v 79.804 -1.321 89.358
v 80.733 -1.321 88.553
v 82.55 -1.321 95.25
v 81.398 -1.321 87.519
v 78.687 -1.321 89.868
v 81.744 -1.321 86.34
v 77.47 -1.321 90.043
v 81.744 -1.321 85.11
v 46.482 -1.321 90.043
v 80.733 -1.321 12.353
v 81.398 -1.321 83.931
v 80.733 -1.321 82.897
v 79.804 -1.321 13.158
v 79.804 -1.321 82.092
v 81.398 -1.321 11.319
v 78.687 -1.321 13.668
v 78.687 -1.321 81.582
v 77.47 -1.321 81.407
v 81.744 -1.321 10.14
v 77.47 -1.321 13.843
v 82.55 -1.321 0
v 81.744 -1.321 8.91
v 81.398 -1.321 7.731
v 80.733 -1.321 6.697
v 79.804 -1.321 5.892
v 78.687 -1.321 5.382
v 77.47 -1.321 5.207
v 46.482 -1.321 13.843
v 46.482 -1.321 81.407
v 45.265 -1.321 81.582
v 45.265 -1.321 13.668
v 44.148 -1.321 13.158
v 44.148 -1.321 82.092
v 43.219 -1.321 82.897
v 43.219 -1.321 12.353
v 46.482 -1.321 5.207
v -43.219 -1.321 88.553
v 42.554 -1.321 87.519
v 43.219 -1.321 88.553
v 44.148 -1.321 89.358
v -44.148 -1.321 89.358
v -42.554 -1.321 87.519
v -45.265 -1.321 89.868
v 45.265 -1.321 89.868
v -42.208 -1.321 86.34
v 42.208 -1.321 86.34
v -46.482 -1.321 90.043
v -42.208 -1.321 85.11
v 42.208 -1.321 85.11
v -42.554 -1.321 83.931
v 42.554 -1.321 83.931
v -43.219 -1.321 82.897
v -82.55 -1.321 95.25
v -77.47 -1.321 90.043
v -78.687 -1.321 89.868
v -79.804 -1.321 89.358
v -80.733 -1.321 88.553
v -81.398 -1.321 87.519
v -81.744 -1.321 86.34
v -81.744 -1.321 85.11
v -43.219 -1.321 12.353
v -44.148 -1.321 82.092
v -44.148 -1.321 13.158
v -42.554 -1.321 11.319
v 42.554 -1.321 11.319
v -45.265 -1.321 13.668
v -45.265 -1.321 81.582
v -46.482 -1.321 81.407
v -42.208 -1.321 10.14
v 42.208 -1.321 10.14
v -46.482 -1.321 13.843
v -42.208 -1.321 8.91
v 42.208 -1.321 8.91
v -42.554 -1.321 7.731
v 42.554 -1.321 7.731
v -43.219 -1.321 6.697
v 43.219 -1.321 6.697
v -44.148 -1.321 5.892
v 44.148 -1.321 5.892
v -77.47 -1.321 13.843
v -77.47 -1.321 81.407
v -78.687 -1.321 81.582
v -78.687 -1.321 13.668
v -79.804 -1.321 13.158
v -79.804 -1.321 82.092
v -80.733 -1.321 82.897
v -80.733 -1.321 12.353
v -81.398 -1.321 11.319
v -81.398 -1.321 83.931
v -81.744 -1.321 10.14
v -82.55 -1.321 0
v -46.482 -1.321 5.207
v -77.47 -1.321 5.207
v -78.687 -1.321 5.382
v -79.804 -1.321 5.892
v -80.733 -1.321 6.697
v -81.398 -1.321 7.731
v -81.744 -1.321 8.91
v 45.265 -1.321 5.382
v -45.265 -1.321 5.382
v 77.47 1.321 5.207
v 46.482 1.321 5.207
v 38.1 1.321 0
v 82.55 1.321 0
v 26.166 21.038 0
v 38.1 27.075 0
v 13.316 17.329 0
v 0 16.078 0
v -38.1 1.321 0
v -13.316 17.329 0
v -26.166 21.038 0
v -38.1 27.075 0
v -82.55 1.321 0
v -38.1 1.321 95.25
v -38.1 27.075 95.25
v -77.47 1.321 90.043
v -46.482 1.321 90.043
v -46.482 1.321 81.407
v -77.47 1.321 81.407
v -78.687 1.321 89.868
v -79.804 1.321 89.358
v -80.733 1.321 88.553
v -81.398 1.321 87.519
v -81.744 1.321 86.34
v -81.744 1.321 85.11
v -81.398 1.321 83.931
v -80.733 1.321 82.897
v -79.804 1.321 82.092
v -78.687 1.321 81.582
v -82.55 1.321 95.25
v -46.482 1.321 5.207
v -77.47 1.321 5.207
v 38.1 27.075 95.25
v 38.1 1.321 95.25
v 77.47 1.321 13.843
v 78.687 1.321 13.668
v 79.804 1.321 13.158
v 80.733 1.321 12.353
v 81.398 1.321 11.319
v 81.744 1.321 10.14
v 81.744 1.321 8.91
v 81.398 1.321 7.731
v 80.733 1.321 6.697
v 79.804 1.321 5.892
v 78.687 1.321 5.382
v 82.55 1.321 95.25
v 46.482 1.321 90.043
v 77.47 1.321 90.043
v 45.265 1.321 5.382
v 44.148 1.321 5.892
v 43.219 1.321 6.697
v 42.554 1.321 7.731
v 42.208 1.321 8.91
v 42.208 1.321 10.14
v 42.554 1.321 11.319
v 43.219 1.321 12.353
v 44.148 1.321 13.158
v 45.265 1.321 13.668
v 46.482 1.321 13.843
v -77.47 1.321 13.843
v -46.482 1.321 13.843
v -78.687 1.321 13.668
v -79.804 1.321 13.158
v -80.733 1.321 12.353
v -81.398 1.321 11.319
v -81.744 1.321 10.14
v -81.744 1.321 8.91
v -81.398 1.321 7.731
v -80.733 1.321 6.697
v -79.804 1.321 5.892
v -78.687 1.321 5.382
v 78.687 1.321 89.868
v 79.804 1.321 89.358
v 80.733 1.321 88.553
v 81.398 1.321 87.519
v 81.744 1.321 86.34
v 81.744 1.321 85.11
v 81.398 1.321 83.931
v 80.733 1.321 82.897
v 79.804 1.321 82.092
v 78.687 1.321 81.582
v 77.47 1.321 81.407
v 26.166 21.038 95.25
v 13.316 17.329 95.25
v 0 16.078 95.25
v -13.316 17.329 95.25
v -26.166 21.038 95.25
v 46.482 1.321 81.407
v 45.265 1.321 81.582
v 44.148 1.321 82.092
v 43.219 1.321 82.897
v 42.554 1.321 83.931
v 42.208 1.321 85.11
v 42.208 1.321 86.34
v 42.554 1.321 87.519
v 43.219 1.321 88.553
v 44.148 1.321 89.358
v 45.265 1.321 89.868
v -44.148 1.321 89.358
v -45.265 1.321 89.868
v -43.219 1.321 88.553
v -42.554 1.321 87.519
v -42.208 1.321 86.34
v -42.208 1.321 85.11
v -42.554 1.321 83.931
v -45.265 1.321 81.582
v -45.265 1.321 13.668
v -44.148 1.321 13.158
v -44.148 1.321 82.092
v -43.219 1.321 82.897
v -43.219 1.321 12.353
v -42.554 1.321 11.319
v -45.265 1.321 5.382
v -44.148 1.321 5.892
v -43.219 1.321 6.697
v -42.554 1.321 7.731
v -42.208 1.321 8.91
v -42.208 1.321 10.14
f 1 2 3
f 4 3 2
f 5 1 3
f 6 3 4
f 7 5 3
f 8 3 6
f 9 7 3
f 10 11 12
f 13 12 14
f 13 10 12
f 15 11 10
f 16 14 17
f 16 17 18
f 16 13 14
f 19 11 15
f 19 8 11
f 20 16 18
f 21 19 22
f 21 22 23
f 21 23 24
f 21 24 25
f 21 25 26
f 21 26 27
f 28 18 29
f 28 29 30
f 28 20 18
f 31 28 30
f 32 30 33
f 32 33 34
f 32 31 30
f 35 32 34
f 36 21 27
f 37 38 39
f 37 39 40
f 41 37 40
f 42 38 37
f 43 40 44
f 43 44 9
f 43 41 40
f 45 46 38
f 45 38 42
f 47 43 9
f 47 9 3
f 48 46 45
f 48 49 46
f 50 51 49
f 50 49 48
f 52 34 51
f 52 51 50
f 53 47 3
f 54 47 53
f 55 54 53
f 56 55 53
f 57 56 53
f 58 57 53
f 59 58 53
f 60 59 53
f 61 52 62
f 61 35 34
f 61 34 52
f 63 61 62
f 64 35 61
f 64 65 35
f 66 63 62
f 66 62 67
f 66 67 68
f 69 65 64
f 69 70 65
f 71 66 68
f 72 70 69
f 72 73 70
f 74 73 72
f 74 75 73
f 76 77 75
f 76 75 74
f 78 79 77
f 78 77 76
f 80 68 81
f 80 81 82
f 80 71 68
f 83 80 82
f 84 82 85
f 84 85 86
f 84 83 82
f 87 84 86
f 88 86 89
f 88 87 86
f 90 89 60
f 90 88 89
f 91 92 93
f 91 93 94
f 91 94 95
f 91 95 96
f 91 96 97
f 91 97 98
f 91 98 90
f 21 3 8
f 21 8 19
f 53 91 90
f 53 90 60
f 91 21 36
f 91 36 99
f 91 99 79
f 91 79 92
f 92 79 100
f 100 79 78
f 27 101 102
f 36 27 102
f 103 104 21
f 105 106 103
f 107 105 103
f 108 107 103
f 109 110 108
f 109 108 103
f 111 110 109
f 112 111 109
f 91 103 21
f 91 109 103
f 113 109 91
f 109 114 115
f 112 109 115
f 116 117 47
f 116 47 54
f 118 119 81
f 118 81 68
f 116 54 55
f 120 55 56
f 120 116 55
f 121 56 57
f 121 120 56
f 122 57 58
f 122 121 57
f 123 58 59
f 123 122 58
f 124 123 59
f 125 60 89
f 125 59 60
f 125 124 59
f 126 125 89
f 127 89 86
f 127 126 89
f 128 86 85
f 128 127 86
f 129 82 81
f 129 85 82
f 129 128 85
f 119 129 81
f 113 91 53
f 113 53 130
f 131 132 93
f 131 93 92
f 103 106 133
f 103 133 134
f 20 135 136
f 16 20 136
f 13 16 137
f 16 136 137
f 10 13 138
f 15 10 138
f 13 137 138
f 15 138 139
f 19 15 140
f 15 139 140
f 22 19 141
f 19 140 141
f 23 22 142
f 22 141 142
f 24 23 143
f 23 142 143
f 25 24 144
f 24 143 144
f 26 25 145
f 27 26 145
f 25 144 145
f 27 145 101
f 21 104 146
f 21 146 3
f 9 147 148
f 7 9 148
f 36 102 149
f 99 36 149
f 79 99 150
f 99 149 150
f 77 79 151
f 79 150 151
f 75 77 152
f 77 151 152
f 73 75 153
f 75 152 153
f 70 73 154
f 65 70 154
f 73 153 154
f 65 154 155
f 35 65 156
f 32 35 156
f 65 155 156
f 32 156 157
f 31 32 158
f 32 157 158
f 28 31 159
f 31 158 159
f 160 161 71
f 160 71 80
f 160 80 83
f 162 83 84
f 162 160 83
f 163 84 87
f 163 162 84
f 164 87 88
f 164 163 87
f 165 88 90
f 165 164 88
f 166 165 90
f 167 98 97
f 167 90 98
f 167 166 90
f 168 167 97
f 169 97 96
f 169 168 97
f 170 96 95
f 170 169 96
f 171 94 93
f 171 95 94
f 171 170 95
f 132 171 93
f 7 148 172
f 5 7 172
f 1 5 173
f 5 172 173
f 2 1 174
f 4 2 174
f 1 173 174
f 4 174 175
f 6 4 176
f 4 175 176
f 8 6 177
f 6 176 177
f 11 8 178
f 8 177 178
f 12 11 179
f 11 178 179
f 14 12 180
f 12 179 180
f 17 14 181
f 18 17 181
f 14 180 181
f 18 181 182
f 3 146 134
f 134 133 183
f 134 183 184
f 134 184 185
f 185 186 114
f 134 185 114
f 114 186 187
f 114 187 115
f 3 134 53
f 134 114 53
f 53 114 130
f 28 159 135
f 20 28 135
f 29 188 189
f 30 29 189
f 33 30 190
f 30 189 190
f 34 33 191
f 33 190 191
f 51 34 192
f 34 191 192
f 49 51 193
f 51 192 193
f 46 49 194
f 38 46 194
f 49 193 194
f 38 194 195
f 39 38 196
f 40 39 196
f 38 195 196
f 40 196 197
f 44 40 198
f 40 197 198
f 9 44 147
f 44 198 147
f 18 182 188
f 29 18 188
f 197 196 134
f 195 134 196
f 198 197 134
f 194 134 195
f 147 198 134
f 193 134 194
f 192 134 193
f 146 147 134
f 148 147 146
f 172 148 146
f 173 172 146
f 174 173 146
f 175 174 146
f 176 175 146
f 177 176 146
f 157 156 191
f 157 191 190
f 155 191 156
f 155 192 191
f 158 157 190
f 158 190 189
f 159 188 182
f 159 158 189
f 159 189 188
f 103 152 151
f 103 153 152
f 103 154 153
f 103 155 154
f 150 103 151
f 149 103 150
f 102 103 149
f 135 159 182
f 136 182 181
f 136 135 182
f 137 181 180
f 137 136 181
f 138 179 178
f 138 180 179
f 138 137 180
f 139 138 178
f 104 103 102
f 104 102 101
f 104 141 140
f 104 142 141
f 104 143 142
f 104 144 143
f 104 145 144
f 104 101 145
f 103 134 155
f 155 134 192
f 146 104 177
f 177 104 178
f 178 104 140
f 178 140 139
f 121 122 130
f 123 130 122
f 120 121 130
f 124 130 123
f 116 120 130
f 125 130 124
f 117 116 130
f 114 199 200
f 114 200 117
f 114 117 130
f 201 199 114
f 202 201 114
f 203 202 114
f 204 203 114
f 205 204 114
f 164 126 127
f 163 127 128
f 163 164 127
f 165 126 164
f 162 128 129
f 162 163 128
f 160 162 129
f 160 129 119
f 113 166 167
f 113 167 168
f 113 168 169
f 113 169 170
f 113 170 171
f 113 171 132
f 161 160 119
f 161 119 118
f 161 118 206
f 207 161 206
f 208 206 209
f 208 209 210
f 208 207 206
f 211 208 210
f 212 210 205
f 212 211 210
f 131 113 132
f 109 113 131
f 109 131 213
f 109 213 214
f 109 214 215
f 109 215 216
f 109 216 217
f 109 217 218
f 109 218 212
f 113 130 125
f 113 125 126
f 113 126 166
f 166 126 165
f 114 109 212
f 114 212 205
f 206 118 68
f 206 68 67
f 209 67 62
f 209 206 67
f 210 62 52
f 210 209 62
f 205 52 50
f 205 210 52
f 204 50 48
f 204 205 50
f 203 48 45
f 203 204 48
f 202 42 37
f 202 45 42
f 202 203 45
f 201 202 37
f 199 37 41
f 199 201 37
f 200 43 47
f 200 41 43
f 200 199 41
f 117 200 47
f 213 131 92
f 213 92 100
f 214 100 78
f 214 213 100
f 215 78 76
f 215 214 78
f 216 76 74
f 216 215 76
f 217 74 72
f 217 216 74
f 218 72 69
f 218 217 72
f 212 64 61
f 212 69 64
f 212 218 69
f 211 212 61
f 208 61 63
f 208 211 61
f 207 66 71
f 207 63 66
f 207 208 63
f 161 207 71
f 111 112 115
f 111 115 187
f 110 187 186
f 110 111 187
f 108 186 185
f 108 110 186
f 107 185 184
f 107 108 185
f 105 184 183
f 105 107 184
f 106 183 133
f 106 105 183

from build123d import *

# Parameters (mm, degrees)
BOSS_EXTRUDE1_DEPTH = 95.25
CUT_EXTRUDE1_DEPTH  = 95.25


with BuildPart() as part:
    # Sketch2 → Boss-Extrude1 (new body)
    with BuildSketch(Plane.XY):
        with BuildLine():
            Line((38.1, 1.3208), (82.55, 1.3208))
            Line((82.55, 1.3208), (82.55, -1.3208))
            Line((82.55, -1.3208), (-82.55, -1.3208))
            Line((-82.55, -1.3208), (-82.55, 1.3208))
            Line((-82.55, 1.3208), (-38.1, 1.3208))
            Line((-38.1, 1.3208), (-38.1, 27.074795193))
            ThreePointArc((-38.1, 27.074795193), (0, 16.0782), (38.1, 27.074795193))
            Line((38.1, 27.074795193), (38.1, 1.3208))
        make_face()
    extrude(amount=BOSS_EXTRUDE1_DEPTH)

    # Sketch3 → Cut-Extrude1 (cut)
    with BuildSketch(Plane(origin=(0, 1.3208, 0), x_dir=(1, 0, 0), z_dir=(0, 1, 0))):
        with BuildLine():
            Line((-77.47, -5.207), (-46.482, -5.207))
            ThreePointArc((-46.482, -5.207), (-42.164, -9.525), (-46.482, -13.843))
            Line((-46.482, -13.843), (-77.47, -13.843))
            ThreePointArc((-77.47, -13.843), (-81.788, -9.525), (-77.47, -5.207))
        make_face()
        with BuildLine():
            Line((-77.47, -81.407), (-46.482, -81.407))
            ThreePointArc((-46.482, -81.407), (-42.164, -85.725), (-46.482, -90.043))
            Line((-46.482, -90.043), (-77.47, -90.043))
            ThreePointArc((-77.47, -90.043), (-81.788, -85.725), (-77.47, -81.407))
        make_face()
    cut_extrude1 = extrude(amount=-CUT_EXTRUDE1_DEPTH, mode=Mode.SUBTRACT)

    # Mirror2: Cut-Extrude1 across plane
    add(cut_extrude1.mirror(Plane(origin=(0, 0, 0), x_dir=(0, 0, 1), z_dir=(1, 0, 0))), mode=Mode.SUBTRACT)


solid = part.part
